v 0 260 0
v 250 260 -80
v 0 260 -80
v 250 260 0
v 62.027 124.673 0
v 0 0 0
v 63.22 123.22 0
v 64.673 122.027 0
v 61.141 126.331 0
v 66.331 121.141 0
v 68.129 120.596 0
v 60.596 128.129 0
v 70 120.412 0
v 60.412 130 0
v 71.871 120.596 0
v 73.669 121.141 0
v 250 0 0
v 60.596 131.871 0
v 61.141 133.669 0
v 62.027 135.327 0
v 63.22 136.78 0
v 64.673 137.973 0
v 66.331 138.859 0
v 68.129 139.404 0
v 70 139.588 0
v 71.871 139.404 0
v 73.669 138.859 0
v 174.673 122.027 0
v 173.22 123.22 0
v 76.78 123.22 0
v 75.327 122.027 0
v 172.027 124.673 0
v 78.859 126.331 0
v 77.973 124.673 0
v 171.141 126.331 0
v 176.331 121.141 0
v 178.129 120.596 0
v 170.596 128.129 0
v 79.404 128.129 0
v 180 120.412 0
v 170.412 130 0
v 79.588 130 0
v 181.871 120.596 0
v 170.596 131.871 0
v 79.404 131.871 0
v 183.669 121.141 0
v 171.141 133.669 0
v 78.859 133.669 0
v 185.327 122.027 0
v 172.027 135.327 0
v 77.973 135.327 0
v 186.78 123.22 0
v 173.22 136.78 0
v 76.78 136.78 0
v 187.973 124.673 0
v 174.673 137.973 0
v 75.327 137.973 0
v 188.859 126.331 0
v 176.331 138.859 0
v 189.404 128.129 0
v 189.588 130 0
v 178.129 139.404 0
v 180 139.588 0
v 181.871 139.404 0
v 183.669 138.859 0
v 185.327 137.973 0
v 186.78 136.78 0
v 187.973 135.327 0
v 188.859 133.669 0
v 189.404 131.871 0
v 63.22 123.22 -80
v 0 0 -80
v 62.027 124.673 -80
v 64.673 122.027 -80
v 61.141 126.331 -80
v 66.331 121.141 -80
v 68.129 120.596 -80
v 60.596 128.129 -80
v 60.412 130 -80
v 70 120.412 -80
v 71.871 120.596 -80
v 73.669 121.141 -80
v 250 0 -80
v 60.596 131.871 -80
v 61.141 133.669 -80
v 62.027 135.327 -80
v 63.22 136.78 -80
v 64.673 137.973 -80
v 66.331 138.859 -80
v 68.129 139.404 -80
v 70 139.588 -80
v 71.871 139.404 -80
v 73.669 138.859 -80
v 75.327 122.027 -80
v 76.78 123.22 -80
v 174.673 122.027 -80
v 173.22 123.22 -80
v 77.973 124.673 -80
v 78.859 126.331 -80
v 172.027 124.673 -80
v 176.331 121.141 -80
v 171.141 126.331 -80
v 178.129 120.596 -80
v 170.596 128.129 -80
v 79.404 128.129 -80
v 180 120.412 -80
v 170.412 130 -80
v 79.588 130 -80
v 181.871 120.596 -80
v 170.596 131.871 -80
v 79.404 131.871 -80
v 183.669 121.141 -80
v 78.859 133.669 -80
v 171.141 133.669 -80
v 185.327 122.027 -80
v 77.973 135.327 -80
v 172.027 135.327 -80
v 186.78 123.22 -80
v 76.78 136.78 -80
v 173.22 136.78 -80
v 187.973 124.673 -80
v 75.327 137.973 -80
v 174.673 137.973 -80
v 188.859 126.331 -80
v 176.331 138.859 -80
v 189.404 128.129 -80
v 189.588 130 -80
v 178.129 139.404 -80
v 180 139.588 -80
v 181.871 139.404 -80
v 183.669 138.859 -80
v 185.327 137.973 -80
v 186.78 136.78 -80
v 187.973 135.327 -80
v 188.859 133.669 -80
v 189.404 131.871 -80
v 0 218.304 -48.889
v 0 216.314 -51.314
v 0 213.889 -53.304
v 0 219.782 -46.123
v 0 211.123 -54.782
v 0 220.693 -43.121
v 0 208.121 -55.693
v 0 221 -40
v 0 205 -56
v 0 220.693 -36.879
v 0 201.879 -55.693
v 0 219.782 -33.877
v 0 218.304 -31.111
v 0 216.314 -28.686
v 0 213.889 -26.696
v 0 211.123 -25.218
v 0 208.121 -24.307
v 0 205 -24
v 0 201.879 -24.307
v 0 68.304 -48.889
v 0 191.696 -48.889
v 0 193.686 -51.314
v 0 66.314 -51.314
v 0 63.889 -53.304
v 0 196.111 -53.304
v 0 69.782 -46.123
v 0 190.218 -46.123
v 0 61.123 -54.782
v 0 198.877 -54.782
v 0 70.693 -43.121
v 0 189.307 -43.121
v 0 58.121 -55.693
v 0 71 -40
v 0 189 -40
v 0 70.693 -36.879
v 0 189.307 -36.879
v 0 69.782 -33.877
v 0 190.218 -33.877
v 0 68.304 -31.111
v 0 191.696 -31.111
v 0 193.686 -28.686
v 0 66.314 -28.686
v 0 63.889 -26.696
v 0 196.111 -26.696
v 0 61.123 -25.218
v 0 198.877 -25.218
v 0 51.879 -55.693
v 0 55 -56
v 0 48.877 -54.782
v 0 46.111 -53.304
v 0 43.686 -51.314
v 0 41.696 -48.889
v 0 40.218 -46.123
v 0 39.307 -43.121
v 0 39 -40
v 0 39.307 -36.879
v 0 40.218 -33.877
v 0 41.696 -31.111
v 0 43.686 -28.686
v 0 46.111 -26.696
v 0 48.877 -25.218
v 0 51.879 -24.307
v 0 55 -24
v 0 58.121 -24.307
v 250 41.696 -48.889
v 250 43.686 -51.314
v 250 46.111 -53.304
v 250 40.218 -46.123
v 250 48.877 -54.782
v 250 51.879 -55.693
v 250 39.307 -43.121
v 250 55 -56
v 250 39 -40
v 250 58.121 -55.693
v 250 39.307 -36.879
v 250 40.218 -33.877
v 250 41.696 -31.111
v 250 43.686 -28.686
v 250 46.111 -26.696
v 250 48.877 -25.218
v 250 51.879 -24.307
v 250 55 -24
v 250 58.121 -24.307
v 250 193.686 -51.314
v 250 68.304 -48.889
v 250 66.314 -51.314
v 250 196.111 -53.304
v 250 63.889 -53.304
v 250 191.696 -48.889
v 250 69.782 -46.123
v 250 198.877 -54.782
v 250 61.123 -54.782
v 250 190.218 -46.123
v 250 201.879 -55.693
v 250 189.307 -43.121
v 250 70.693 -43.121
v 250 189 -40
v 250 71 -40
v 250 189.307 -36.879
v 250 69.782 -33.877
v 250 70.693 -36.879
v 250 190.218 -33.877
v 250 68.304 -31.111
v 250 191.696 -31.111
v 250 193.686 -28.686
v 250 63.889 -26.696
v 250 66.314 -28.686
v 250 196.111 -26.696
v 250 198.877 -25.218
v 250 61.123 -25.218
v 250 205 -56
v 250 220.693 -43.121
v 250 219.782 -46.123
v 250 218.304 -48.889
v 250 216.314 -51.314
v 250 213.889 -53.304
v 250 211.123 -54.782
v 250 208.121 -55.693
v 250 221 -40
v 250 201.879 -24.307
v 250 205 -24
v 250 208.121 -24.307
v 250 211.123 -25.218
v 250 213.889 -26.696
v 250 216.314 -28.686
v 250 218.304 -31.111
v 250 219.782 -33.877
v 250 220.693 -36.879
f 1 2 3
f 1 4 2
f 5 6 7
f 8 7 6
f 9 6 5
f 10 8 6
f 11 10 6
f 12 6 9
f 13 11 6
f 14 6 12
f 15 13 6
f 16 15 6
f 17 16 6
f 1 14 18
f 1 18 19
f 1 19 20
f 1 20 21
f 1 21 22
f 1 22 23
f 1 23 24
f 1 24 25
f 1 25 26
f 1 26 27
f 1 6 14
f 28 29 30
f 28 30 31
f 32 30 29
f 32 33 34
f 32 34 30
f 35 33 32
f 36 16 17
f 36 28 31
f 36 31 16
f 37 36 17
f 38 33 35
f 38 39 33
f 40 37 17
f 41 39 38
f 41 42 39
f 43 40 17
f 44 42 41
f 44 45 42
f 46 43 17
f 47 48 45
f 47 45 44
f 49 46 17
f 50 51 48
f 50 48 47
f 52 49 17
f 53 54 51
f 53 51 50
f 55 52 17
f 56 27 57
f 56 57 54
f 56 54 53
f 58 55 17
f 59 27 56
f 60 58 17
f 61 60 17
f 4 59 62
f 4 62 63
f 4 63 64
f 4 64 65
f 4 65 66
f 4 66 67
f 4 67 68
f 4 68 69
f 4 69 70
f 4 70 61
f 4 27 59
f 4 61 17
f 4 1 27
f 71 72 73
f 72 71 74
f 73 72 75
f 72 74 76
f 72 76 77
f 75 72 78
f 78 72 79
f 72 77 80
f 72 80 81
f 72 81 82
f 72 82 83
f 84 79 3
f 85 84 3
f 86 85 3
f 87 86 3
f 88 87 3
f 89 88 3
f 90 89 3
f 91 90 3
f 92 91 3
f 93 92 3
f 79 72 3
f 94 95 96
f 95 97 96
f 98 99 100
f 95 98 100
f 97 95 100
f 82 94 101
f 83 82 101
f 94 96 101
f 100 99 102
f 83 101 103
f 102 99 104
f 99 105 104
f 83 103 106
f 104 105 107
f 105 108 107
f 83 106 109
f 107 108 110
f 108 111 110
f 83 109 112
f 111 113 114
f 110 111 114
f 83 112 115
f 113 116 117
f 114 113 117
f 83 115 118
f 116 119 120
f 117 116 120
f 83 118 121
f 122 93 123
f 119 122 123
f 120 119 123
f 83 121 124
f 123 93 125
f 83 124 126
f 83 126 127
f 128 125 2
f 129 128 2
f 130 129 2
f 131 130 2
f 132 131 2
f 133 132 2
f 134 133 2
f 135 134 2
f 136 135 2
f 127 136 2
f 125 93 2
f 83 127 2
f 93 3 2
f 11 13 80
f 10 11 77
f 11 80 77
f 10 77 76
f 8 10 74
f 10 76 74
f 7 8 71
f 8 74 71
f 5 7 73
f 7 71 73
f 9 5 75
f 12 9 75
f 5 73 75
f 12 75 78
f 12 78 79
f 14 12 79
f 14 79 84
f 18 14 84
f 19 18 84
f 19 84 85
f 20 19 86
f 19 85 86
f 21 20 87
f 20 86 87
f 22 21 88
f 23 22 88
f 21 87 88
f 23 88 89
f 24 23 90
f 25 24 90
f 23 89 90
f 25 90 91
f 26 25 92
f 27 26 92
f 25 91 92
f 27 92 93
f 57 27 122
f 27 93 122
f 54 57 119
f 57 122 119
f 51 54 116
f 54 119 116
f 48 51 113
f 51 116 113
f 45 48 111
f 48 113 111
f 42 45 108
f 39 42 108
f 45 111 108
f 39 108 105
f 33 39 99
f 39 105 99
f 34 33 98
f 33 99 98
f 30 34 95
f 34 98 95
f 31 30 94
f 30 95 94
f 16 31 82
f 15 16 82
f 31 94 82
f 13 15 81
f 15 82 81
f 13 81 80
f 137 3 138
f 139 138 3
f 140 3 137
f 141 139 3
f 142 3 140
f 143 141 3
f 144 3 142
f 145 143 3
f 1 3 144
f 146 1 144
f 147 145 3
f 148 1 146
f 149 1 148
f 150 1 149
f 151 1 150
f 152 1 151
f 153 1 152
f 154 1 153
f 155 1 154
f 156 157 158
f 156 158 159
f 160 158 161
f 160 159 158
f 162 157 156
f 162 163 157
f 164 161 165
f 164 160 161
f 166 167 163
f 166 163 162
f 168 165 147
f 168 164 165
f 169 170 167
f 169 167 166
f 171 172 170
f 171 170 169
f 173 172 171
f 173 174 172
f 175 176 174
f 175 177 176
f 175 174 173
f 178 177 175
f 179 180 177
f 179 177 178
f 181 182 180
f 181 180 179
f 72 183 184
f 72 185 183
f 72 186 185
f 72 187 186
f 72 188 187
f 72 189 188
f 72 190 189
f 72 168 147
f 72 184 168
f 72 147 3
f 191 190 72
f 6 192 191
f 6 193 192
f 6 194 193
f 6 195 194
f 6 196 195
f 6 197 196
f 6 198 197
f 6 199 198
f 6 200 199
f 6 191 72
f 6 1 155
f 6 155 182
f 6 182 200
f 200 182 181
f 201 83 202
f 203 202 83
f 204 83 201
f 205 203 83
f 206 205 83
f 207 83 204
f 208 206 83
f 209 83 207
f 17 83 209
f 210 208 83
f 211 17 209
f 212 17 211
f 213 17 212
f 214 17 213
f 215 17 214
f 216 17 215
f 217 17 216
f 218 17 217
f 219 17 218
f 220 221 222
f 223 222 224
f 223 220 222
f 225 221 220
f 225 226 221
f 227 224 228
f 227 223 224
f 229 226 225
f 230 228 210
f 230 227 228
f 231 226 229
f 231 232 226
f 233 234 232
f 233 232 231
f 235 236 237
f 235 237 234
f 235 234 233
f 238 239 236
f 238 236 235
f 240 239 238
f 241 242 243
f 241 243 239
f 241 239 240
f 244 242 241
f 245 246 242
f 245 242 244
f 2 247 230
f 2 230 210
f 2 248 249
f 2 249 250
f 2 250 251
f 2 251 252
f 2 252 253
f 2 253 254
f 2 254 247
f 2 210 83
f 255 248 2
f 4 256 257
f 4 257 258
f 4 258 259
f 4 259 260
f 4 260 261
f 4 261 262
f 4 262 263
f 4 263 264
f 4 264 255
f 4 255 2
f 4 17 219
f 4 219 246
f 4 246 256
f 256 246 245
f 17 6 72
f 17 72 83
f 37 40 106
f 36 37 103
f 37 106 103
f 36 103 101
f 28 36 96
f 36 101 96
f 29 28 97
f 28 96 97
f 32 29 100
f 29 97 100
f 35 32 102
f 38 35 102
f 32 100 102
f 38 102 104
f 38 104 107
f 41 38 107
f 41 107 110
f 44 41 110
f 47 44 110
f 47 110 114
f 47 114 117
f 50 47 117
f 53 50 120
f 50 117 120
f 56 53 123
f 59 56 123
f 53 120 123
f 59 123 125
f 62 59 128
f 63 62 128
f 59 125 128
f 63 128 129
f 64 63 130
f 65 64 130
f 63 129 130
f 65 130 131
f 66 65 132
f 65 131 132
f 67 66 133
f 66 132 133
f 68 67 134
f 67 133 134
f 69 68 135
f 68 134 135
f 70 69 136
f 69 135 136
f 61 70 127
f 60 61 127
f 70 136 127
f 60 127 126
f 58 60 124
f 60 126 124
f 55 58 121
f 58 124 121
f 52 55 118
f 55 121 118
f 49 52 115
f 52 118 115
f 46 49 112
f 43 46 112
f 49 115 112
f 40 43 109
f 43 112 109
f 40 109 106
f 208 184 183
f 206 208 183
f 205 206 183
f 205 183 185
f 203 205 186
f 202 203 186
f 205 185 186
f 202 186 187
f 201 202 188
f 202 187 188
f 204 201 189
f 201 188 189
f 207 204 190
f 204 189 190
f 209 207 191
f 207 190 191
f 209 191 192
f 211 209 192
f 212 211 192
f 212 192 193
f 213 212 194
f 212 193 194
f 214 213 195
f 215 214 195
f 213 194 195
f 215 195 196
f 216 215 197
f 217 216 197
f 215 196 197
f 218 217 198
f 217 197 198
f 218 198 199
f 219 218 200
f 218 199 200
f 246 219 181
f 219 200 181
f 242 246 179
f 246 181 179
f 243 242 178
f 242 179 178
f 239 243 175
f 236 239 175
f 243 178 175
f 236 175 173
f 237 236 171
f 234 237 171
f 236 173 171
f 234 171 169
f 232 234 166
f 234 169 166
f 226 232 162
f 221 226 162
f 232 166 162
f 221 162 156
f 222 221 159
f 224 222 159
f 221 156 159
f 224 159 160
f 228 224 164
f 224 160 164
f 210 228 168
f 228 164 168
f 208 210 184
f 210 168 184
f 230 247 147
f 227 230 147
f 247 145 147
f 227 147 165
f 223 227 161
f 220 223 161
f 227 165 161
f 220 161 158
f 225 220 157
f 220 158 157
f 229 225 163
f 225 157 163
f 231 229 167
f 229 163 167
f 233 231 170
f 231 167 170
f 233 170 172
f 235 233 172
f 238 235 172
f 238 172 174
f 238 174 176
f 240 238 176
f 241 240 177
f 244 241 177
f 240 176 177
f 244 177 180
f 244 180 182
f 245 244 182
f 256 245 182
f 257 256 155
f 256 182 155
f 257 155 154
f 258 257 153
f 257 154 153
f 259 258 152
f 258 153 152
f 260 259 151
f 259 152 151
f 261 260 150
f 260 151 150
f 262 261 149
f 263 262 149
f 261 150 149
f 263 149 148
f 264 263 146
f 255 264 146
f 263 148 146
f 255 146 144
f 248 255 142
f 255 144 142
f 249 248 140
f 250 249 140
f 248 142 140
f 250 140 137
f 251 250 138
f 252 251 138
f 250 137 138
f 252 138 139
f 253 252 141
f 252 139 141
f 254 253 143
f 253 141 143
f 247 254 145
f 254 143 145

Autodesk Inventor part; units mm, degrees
ref_plane "YZ Plane" through (0, 0, 0) normal (1, 0, 0) x (0, 1, 0)
ref_plane "XZ Plane" through (0, 0, 0) normal (0, 1, 0) x (-1, 0, 0)
ref_plane "XY Plane" through (0, 0, 0) normal (0, 0, 1) x (1, 0, 0)
sketch "Sketch1" plane through (0, 0, 0) normal (0, 0, 1) x (1, 0, 0)
  line L0 (0, 0) -> (250, 0)
  line L1 (250, 0) -> (250, 260)
  line L2 (250, 260) -> (0, 260)
  line L3 (0, 260) -> (0, 0)
  dimension "d0" = 250
  dimension "d1" = 260
extrude "Extrusion1" add sketch "Sketch1" against normal blind 80
sketch "Sketch2" plane through (250, 0, 0) normal (1, 0, 0) x (0, 0, -1)
  line L0 (0, 0) -> (0, 260) projected
  line L1 (0, 260) -> (80, 260) projected
  point P0 (40, 205)
  point P1 (40, 55)
  dimension "d4" = 40
  dimension "d5" = 40
  dimension "d6" = 150
  dimension "d7" = 55
hole "Hole1" at (250, 205, -40) at (250, 55, -40) direction (-1, 0, 0) diameter 32 end through all
sketch "Sketch3" plane through (0, 0, 0) normal (0, 0, 1) x (1, 0, 0)
  line L0 (0, 0) -> (250, 0) projected
  line L1 (250, 260) -> (0, 260) projected
  line L2 (0, 260) -> (0, 0) projected
  line L3 (250, 0) -> (250, 260) projected
  point P0 (70, 130)
  point P1 (180, 130)
  dimension "d16" = 130
  dimension "d17" = 130
  dimension "d18" = 70
  dimension "d19" = 70
hole "Hole2" at (70, 130, 0) at (180, 130, 0) direction (0, 0, -1) diameter 19.177 end through all thread size "7/8-9 UNC" class "2B" standard "ANSI Unified Screw Threads"
equation "\"d5\" = d4"
equation "\"d17\" = d16"
equation "\"d19\" = d18"
properties part number "Soporte barras"
